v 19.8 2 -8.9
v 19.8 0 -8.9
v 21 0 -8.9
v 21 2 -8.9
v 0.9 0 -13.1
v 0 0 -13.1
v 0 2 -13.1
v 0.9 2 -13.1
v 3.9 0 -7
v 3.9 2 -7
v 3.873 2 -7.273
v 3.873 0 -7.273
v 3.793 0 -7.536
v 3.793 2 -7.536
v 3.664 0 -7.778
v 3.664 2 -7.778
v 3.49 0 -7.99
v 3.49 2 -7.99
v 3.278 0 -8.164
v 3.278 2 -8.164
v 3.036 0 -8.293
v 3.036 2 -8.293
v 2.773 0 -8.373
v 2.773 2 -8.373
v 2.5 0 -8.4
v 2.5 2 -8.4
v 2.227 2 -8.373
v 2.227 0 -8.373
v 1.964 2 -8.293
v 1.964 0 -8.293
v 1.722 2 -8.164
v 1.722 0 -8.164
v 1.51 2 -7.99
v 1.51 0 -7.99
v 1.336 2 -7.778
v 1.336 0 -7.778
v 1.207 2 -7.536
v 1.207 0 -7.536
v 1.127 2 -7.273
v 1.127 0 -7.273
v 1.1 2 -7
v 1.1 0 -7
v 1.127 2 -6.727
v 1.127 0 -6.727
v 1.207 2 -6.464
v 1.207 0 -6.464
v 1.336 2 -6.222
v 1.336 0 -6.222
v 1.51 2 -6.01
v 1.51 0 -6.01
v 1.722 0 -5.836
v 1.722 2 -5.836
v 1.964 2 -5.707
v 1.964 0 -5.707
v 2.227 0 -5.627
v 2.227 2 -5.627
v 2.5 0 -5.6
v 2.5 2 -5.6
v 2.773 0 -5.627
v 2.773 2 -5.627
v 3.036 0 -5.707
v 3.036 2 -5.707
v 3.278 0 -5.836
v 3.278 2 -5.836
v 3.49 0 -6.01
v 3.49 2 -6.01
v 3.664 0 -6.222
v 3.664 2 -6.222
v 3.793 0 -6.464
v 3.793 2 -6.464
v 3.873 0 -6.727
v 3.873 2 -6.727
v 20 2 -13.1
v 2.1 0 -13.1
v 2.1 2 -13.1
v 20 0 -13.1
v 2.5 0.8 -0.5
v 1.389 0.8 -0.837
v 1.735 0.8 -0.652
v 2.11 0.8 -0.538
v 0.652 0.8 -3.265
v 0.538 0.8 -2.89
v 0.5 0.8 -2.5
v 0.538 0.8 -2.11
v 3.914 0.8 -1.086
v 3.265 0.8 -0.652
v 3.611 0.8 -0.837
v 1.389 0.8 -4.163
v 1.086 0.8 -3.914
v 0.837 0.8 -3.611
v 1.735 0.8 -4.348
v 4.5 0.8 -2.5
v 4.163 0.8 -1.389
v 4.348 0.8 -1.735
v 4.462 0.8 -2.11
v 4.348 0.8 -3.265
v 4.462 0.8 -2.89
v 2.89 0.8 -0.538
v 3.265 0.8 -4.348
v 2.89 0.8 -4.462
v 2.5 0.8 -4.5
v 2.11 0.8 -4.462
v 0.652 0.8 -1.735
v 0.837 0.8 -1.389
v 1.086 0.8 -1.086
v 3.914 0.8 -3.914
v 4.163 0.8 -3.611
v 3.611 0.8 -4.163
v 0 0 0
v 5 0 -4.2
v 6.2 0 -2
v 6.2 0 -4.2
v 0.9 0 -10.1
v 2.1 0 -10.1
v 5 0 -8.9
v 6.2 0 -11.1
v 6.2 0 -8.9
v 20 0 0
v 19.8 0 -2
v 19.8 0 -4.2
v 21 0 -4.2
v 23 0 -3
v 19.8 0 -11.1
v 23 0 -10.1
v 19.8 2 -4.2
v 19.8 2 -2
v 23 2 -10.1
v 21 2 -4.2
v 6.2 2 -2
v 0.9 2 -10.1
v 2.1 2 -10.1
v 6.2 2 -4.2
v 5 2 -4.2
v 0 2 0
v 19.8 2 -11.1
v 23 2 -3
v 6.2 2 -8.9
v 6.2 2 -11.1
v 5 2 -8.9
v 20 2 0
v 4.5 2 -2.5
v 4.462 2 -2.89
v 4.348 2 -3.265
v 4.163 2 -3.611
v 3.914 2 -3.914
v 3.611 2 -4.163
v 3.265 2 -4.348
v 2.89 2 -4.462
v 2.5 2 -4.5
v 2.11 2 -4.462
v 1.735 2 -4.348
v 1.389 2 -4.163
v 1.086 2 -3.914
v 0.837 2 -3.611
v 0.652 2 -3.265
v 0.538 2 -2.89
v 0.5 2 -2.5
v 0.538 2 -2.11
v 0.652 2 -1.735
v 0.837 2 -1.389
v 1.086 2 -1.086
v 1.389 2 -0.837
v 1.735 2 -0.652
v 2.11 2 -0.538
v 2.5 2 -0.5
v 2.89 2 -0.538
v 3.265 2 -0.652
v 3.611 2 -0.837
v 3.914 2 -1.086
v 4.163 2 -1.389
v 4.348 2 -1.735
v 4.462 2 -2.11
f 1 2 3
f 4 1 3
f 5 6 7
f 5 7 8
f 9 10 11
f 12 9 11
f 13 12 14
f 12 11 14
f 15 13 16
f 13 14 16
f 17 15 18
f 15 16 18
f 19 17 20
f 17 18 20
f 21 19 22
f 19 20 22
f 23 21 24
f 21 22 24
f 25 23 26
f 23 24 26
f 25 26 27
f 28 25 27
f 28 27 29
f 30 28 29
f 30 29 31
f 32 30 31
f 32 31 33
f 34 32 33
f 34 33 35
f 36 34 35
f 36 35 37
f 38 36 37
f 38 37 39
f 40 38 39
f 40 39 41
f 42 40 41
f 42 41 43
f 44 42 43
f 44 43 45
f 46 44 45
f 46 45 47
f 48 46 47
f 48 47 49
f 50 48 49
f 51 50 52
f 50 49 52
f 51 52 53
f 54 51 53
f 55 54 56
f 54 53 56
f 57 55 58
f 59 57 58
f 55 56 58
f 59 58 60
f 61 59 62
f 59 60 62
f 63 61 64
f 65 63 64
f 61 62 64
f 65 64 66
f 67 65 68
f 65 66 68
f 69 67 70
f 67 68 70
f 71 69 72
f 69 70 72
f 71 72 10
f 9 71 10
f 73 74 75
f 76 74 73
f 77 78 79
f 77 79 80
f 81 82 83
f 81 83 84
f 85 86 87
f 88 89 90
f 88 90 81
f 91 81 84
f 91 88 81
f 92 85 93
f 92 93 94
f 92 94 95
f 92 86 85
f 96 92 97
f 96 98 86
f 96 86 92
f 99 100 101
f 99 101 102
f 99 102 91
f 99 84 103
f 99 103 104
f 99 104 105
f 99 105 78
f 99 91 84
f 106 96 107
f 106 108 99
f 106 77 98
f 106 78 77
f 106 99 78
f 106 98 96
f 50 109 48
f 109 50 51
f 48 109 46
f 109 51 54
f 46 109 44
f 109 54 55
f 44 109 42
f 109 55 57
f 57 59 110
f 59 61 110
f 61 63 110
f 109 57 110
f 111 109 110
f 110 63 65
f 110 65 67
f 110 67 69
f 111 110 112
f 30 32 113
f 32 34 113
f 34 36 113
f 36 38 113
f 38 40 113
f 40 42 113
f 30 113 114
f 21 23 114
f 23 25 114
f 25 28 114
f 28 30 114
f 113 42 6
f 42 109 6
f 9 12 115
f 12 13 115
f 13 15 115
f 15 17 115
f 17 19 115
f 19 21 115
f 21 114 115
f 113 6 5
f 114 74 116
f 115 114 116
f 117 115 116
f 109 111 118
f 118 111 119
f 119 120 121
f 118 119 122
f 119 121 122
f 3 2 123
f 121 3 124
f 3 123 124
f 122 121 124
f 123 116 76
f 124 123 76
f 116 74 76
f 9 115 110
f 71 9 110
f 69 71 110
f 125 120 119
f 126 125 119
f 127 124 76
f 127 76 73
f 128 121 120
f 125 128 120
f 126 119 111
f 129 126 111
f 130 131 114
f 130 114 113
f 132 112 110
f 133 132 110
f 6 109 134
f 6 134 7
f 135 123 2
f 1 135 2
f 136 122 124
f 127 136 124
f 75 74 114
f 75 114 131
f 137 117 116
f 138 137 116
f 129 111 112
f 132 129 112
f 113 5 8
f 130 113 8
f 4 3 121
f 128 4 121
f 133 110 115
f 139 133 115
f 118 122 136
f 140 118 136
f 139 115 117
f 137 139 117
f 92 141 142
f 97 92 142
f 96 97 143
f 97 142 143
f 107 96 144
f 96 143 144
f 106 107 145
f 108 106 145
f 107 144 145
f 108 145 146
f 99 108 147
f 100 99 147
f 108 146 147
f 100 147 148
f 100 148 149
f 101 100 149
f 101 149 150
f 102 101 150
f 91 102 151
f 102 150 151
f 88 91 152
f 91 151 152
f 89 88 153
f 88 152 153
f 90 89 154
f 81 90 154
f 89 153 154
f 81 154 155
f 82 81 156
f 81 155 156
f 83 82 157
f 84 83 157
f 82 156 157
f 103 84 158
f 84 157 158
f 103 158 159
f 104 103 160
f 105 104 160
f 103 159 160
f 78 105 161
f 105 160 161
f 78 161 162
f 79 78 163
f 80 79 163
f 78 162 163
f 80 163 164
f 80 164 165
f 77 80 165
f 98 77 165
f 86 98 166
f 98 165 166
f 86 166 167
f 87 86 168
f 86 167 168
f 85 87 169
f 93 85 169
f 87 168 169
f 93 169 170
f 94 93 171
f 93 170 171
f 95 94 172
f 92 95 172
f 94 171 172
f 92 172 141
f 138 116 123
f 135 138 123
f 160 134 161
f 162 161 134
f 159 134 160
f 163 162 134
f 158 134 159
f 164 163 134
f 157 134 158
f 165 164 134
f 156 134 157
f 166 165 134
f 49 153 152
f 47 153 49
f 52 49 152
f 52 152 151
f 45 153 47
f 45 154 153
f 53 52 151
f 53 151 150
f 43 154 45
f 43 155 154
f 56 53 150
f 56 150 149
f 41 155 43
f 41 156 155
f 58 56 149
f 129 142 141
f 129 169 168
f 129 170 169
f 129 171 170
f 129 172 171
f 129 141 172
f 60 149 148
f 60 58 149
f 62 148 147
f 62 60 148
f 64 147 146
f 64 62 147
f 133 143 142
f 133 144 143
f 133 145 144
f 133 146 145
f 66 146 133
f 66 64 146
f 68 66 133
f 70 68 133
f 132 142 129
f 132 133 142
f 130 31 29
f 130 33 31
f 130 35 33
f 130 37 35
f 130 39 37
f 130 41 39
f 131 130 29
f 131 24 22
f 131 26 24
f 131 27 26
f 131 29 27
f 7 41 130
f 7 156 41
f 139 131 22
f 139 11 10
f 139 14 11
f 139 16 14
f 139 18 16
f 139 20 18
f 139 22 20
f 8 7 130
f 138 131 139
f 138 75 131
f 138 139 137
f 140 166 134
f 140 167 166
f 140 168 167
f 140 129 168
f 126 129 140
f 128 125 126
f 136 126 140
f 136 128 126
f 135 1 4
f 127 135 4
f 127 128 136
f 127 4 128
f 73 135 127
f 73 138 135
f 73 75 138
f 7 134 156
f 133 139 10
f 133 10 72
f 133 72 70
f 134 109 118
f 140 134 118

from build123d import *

# Parameters (mm, degrees)
ESQUISSE1_W             = 23
ESQUISSE1_H             = 13.1
BOSS_EXTRU_1_DEPTH      = 2
ENL_V_MAT_EXTRU_4_REACH = 4
ESQUISSE2_R             = 1.4
CHANFREIN1_SIZE         = 3
ESQUISSE3_W             = 1.2
ESQUISSE3_H             = 2
ENL_V_MAT_EXTRU_5_DEPTH = 3
ESQUISSE4_R             = 2
ENL_V_MAT_EXTRU_6_DEPTH = 1.2


with BuildPart() as part:
    # Esquisse1 → Boss.-Extru.1 (new body)
    with BuildSketch(Plane(origin=(0, 0, 0), x_dir=(1, 0, 0), z_dir=(0, 1, 0))):
        with Locations((11.5, 6.55)):
            Rectangle(ESQUISSE1_W, ESQUISSE1_H)
        Polygon((6.2, 8.9), (6.2, 11.1), (19.8, 11.1), (19.8, 8.9), (21, 8.9), (21, 4.2), (19.8, 4.2), (19.8, 2), (6.2, 2), (6.2, 4.2), (5, 4.2), (5, 8.9), align=None, mode=Mode.SUBTRACT)
    extrude(amount=BOSS_EXTRU_1_DEPTH)

    # Esquisse2 → Enlèv. mat.-Extru.4 (cut, up to next)
    with BuildSketch(Plane(origin=(0, 2, 0), x_dir=(1, 0, 0), z_dir=(0, 1, 0)), mode=Mode.PRIVATE) as enl_v_mat_extru_4_sk1:
        with Locations((2.5, 7)):
            Circle(ESQUISSE2_R)
    enl_v_mat_extru_4_tool1 = extrude(enl_v_mat_extru_4_sk1.sketch, amount=-ENL_V_MAT_EXTRU_4_REACH, mode=Mode.PRIVATE) & part.part
    add(enl_v_mat_extru_4_tool1.solids().sort_by_distance((2.5, 2, -7))[0], mode=Mode.SUBTRACT)

    # Chanfrein1
    chanfrein1_edges = [part.edges().sort_by_distance(p)[0] for p in [
        (23, 1, -13.1),
        (23, 1, 0),
    ]]
    chamfer(chanfrein1_edges, length=CHANFREIN1_SIZE)

    # Esquisse3 → Enlèv. mat.-Extru.5 (cut)
    with BuildSketch(Plane(origin=(0, 0, -13.1), x_dir=(-1, 0, 0), z_dir=(0, 0, -1))):
        with Locations((-1.5, 1)):
            Rectangle(ESQUISSE3_W, ESQUISSE3_H)
    extrude(amount=-ENL_V_MAT_EXTRU_5_DEPTH, mode=Mode.SUBTRACT)

    # Esquisse4 → Enlèv. mat.-Extru.6 (cut)
    with BuildSketch(Plane(origin=(0, 2, 0), x_dir=(1, 0, 0), z_dir=(0, 1, 0))):
        with Locations((2.5, 2.5)):
            Circle(ESQUISSE4_R)
    extrude(amount=-ENL_V_MAT_EXTRU_6_DEPTH, mode=Mode.SUBTRACT)


solid = part.part
